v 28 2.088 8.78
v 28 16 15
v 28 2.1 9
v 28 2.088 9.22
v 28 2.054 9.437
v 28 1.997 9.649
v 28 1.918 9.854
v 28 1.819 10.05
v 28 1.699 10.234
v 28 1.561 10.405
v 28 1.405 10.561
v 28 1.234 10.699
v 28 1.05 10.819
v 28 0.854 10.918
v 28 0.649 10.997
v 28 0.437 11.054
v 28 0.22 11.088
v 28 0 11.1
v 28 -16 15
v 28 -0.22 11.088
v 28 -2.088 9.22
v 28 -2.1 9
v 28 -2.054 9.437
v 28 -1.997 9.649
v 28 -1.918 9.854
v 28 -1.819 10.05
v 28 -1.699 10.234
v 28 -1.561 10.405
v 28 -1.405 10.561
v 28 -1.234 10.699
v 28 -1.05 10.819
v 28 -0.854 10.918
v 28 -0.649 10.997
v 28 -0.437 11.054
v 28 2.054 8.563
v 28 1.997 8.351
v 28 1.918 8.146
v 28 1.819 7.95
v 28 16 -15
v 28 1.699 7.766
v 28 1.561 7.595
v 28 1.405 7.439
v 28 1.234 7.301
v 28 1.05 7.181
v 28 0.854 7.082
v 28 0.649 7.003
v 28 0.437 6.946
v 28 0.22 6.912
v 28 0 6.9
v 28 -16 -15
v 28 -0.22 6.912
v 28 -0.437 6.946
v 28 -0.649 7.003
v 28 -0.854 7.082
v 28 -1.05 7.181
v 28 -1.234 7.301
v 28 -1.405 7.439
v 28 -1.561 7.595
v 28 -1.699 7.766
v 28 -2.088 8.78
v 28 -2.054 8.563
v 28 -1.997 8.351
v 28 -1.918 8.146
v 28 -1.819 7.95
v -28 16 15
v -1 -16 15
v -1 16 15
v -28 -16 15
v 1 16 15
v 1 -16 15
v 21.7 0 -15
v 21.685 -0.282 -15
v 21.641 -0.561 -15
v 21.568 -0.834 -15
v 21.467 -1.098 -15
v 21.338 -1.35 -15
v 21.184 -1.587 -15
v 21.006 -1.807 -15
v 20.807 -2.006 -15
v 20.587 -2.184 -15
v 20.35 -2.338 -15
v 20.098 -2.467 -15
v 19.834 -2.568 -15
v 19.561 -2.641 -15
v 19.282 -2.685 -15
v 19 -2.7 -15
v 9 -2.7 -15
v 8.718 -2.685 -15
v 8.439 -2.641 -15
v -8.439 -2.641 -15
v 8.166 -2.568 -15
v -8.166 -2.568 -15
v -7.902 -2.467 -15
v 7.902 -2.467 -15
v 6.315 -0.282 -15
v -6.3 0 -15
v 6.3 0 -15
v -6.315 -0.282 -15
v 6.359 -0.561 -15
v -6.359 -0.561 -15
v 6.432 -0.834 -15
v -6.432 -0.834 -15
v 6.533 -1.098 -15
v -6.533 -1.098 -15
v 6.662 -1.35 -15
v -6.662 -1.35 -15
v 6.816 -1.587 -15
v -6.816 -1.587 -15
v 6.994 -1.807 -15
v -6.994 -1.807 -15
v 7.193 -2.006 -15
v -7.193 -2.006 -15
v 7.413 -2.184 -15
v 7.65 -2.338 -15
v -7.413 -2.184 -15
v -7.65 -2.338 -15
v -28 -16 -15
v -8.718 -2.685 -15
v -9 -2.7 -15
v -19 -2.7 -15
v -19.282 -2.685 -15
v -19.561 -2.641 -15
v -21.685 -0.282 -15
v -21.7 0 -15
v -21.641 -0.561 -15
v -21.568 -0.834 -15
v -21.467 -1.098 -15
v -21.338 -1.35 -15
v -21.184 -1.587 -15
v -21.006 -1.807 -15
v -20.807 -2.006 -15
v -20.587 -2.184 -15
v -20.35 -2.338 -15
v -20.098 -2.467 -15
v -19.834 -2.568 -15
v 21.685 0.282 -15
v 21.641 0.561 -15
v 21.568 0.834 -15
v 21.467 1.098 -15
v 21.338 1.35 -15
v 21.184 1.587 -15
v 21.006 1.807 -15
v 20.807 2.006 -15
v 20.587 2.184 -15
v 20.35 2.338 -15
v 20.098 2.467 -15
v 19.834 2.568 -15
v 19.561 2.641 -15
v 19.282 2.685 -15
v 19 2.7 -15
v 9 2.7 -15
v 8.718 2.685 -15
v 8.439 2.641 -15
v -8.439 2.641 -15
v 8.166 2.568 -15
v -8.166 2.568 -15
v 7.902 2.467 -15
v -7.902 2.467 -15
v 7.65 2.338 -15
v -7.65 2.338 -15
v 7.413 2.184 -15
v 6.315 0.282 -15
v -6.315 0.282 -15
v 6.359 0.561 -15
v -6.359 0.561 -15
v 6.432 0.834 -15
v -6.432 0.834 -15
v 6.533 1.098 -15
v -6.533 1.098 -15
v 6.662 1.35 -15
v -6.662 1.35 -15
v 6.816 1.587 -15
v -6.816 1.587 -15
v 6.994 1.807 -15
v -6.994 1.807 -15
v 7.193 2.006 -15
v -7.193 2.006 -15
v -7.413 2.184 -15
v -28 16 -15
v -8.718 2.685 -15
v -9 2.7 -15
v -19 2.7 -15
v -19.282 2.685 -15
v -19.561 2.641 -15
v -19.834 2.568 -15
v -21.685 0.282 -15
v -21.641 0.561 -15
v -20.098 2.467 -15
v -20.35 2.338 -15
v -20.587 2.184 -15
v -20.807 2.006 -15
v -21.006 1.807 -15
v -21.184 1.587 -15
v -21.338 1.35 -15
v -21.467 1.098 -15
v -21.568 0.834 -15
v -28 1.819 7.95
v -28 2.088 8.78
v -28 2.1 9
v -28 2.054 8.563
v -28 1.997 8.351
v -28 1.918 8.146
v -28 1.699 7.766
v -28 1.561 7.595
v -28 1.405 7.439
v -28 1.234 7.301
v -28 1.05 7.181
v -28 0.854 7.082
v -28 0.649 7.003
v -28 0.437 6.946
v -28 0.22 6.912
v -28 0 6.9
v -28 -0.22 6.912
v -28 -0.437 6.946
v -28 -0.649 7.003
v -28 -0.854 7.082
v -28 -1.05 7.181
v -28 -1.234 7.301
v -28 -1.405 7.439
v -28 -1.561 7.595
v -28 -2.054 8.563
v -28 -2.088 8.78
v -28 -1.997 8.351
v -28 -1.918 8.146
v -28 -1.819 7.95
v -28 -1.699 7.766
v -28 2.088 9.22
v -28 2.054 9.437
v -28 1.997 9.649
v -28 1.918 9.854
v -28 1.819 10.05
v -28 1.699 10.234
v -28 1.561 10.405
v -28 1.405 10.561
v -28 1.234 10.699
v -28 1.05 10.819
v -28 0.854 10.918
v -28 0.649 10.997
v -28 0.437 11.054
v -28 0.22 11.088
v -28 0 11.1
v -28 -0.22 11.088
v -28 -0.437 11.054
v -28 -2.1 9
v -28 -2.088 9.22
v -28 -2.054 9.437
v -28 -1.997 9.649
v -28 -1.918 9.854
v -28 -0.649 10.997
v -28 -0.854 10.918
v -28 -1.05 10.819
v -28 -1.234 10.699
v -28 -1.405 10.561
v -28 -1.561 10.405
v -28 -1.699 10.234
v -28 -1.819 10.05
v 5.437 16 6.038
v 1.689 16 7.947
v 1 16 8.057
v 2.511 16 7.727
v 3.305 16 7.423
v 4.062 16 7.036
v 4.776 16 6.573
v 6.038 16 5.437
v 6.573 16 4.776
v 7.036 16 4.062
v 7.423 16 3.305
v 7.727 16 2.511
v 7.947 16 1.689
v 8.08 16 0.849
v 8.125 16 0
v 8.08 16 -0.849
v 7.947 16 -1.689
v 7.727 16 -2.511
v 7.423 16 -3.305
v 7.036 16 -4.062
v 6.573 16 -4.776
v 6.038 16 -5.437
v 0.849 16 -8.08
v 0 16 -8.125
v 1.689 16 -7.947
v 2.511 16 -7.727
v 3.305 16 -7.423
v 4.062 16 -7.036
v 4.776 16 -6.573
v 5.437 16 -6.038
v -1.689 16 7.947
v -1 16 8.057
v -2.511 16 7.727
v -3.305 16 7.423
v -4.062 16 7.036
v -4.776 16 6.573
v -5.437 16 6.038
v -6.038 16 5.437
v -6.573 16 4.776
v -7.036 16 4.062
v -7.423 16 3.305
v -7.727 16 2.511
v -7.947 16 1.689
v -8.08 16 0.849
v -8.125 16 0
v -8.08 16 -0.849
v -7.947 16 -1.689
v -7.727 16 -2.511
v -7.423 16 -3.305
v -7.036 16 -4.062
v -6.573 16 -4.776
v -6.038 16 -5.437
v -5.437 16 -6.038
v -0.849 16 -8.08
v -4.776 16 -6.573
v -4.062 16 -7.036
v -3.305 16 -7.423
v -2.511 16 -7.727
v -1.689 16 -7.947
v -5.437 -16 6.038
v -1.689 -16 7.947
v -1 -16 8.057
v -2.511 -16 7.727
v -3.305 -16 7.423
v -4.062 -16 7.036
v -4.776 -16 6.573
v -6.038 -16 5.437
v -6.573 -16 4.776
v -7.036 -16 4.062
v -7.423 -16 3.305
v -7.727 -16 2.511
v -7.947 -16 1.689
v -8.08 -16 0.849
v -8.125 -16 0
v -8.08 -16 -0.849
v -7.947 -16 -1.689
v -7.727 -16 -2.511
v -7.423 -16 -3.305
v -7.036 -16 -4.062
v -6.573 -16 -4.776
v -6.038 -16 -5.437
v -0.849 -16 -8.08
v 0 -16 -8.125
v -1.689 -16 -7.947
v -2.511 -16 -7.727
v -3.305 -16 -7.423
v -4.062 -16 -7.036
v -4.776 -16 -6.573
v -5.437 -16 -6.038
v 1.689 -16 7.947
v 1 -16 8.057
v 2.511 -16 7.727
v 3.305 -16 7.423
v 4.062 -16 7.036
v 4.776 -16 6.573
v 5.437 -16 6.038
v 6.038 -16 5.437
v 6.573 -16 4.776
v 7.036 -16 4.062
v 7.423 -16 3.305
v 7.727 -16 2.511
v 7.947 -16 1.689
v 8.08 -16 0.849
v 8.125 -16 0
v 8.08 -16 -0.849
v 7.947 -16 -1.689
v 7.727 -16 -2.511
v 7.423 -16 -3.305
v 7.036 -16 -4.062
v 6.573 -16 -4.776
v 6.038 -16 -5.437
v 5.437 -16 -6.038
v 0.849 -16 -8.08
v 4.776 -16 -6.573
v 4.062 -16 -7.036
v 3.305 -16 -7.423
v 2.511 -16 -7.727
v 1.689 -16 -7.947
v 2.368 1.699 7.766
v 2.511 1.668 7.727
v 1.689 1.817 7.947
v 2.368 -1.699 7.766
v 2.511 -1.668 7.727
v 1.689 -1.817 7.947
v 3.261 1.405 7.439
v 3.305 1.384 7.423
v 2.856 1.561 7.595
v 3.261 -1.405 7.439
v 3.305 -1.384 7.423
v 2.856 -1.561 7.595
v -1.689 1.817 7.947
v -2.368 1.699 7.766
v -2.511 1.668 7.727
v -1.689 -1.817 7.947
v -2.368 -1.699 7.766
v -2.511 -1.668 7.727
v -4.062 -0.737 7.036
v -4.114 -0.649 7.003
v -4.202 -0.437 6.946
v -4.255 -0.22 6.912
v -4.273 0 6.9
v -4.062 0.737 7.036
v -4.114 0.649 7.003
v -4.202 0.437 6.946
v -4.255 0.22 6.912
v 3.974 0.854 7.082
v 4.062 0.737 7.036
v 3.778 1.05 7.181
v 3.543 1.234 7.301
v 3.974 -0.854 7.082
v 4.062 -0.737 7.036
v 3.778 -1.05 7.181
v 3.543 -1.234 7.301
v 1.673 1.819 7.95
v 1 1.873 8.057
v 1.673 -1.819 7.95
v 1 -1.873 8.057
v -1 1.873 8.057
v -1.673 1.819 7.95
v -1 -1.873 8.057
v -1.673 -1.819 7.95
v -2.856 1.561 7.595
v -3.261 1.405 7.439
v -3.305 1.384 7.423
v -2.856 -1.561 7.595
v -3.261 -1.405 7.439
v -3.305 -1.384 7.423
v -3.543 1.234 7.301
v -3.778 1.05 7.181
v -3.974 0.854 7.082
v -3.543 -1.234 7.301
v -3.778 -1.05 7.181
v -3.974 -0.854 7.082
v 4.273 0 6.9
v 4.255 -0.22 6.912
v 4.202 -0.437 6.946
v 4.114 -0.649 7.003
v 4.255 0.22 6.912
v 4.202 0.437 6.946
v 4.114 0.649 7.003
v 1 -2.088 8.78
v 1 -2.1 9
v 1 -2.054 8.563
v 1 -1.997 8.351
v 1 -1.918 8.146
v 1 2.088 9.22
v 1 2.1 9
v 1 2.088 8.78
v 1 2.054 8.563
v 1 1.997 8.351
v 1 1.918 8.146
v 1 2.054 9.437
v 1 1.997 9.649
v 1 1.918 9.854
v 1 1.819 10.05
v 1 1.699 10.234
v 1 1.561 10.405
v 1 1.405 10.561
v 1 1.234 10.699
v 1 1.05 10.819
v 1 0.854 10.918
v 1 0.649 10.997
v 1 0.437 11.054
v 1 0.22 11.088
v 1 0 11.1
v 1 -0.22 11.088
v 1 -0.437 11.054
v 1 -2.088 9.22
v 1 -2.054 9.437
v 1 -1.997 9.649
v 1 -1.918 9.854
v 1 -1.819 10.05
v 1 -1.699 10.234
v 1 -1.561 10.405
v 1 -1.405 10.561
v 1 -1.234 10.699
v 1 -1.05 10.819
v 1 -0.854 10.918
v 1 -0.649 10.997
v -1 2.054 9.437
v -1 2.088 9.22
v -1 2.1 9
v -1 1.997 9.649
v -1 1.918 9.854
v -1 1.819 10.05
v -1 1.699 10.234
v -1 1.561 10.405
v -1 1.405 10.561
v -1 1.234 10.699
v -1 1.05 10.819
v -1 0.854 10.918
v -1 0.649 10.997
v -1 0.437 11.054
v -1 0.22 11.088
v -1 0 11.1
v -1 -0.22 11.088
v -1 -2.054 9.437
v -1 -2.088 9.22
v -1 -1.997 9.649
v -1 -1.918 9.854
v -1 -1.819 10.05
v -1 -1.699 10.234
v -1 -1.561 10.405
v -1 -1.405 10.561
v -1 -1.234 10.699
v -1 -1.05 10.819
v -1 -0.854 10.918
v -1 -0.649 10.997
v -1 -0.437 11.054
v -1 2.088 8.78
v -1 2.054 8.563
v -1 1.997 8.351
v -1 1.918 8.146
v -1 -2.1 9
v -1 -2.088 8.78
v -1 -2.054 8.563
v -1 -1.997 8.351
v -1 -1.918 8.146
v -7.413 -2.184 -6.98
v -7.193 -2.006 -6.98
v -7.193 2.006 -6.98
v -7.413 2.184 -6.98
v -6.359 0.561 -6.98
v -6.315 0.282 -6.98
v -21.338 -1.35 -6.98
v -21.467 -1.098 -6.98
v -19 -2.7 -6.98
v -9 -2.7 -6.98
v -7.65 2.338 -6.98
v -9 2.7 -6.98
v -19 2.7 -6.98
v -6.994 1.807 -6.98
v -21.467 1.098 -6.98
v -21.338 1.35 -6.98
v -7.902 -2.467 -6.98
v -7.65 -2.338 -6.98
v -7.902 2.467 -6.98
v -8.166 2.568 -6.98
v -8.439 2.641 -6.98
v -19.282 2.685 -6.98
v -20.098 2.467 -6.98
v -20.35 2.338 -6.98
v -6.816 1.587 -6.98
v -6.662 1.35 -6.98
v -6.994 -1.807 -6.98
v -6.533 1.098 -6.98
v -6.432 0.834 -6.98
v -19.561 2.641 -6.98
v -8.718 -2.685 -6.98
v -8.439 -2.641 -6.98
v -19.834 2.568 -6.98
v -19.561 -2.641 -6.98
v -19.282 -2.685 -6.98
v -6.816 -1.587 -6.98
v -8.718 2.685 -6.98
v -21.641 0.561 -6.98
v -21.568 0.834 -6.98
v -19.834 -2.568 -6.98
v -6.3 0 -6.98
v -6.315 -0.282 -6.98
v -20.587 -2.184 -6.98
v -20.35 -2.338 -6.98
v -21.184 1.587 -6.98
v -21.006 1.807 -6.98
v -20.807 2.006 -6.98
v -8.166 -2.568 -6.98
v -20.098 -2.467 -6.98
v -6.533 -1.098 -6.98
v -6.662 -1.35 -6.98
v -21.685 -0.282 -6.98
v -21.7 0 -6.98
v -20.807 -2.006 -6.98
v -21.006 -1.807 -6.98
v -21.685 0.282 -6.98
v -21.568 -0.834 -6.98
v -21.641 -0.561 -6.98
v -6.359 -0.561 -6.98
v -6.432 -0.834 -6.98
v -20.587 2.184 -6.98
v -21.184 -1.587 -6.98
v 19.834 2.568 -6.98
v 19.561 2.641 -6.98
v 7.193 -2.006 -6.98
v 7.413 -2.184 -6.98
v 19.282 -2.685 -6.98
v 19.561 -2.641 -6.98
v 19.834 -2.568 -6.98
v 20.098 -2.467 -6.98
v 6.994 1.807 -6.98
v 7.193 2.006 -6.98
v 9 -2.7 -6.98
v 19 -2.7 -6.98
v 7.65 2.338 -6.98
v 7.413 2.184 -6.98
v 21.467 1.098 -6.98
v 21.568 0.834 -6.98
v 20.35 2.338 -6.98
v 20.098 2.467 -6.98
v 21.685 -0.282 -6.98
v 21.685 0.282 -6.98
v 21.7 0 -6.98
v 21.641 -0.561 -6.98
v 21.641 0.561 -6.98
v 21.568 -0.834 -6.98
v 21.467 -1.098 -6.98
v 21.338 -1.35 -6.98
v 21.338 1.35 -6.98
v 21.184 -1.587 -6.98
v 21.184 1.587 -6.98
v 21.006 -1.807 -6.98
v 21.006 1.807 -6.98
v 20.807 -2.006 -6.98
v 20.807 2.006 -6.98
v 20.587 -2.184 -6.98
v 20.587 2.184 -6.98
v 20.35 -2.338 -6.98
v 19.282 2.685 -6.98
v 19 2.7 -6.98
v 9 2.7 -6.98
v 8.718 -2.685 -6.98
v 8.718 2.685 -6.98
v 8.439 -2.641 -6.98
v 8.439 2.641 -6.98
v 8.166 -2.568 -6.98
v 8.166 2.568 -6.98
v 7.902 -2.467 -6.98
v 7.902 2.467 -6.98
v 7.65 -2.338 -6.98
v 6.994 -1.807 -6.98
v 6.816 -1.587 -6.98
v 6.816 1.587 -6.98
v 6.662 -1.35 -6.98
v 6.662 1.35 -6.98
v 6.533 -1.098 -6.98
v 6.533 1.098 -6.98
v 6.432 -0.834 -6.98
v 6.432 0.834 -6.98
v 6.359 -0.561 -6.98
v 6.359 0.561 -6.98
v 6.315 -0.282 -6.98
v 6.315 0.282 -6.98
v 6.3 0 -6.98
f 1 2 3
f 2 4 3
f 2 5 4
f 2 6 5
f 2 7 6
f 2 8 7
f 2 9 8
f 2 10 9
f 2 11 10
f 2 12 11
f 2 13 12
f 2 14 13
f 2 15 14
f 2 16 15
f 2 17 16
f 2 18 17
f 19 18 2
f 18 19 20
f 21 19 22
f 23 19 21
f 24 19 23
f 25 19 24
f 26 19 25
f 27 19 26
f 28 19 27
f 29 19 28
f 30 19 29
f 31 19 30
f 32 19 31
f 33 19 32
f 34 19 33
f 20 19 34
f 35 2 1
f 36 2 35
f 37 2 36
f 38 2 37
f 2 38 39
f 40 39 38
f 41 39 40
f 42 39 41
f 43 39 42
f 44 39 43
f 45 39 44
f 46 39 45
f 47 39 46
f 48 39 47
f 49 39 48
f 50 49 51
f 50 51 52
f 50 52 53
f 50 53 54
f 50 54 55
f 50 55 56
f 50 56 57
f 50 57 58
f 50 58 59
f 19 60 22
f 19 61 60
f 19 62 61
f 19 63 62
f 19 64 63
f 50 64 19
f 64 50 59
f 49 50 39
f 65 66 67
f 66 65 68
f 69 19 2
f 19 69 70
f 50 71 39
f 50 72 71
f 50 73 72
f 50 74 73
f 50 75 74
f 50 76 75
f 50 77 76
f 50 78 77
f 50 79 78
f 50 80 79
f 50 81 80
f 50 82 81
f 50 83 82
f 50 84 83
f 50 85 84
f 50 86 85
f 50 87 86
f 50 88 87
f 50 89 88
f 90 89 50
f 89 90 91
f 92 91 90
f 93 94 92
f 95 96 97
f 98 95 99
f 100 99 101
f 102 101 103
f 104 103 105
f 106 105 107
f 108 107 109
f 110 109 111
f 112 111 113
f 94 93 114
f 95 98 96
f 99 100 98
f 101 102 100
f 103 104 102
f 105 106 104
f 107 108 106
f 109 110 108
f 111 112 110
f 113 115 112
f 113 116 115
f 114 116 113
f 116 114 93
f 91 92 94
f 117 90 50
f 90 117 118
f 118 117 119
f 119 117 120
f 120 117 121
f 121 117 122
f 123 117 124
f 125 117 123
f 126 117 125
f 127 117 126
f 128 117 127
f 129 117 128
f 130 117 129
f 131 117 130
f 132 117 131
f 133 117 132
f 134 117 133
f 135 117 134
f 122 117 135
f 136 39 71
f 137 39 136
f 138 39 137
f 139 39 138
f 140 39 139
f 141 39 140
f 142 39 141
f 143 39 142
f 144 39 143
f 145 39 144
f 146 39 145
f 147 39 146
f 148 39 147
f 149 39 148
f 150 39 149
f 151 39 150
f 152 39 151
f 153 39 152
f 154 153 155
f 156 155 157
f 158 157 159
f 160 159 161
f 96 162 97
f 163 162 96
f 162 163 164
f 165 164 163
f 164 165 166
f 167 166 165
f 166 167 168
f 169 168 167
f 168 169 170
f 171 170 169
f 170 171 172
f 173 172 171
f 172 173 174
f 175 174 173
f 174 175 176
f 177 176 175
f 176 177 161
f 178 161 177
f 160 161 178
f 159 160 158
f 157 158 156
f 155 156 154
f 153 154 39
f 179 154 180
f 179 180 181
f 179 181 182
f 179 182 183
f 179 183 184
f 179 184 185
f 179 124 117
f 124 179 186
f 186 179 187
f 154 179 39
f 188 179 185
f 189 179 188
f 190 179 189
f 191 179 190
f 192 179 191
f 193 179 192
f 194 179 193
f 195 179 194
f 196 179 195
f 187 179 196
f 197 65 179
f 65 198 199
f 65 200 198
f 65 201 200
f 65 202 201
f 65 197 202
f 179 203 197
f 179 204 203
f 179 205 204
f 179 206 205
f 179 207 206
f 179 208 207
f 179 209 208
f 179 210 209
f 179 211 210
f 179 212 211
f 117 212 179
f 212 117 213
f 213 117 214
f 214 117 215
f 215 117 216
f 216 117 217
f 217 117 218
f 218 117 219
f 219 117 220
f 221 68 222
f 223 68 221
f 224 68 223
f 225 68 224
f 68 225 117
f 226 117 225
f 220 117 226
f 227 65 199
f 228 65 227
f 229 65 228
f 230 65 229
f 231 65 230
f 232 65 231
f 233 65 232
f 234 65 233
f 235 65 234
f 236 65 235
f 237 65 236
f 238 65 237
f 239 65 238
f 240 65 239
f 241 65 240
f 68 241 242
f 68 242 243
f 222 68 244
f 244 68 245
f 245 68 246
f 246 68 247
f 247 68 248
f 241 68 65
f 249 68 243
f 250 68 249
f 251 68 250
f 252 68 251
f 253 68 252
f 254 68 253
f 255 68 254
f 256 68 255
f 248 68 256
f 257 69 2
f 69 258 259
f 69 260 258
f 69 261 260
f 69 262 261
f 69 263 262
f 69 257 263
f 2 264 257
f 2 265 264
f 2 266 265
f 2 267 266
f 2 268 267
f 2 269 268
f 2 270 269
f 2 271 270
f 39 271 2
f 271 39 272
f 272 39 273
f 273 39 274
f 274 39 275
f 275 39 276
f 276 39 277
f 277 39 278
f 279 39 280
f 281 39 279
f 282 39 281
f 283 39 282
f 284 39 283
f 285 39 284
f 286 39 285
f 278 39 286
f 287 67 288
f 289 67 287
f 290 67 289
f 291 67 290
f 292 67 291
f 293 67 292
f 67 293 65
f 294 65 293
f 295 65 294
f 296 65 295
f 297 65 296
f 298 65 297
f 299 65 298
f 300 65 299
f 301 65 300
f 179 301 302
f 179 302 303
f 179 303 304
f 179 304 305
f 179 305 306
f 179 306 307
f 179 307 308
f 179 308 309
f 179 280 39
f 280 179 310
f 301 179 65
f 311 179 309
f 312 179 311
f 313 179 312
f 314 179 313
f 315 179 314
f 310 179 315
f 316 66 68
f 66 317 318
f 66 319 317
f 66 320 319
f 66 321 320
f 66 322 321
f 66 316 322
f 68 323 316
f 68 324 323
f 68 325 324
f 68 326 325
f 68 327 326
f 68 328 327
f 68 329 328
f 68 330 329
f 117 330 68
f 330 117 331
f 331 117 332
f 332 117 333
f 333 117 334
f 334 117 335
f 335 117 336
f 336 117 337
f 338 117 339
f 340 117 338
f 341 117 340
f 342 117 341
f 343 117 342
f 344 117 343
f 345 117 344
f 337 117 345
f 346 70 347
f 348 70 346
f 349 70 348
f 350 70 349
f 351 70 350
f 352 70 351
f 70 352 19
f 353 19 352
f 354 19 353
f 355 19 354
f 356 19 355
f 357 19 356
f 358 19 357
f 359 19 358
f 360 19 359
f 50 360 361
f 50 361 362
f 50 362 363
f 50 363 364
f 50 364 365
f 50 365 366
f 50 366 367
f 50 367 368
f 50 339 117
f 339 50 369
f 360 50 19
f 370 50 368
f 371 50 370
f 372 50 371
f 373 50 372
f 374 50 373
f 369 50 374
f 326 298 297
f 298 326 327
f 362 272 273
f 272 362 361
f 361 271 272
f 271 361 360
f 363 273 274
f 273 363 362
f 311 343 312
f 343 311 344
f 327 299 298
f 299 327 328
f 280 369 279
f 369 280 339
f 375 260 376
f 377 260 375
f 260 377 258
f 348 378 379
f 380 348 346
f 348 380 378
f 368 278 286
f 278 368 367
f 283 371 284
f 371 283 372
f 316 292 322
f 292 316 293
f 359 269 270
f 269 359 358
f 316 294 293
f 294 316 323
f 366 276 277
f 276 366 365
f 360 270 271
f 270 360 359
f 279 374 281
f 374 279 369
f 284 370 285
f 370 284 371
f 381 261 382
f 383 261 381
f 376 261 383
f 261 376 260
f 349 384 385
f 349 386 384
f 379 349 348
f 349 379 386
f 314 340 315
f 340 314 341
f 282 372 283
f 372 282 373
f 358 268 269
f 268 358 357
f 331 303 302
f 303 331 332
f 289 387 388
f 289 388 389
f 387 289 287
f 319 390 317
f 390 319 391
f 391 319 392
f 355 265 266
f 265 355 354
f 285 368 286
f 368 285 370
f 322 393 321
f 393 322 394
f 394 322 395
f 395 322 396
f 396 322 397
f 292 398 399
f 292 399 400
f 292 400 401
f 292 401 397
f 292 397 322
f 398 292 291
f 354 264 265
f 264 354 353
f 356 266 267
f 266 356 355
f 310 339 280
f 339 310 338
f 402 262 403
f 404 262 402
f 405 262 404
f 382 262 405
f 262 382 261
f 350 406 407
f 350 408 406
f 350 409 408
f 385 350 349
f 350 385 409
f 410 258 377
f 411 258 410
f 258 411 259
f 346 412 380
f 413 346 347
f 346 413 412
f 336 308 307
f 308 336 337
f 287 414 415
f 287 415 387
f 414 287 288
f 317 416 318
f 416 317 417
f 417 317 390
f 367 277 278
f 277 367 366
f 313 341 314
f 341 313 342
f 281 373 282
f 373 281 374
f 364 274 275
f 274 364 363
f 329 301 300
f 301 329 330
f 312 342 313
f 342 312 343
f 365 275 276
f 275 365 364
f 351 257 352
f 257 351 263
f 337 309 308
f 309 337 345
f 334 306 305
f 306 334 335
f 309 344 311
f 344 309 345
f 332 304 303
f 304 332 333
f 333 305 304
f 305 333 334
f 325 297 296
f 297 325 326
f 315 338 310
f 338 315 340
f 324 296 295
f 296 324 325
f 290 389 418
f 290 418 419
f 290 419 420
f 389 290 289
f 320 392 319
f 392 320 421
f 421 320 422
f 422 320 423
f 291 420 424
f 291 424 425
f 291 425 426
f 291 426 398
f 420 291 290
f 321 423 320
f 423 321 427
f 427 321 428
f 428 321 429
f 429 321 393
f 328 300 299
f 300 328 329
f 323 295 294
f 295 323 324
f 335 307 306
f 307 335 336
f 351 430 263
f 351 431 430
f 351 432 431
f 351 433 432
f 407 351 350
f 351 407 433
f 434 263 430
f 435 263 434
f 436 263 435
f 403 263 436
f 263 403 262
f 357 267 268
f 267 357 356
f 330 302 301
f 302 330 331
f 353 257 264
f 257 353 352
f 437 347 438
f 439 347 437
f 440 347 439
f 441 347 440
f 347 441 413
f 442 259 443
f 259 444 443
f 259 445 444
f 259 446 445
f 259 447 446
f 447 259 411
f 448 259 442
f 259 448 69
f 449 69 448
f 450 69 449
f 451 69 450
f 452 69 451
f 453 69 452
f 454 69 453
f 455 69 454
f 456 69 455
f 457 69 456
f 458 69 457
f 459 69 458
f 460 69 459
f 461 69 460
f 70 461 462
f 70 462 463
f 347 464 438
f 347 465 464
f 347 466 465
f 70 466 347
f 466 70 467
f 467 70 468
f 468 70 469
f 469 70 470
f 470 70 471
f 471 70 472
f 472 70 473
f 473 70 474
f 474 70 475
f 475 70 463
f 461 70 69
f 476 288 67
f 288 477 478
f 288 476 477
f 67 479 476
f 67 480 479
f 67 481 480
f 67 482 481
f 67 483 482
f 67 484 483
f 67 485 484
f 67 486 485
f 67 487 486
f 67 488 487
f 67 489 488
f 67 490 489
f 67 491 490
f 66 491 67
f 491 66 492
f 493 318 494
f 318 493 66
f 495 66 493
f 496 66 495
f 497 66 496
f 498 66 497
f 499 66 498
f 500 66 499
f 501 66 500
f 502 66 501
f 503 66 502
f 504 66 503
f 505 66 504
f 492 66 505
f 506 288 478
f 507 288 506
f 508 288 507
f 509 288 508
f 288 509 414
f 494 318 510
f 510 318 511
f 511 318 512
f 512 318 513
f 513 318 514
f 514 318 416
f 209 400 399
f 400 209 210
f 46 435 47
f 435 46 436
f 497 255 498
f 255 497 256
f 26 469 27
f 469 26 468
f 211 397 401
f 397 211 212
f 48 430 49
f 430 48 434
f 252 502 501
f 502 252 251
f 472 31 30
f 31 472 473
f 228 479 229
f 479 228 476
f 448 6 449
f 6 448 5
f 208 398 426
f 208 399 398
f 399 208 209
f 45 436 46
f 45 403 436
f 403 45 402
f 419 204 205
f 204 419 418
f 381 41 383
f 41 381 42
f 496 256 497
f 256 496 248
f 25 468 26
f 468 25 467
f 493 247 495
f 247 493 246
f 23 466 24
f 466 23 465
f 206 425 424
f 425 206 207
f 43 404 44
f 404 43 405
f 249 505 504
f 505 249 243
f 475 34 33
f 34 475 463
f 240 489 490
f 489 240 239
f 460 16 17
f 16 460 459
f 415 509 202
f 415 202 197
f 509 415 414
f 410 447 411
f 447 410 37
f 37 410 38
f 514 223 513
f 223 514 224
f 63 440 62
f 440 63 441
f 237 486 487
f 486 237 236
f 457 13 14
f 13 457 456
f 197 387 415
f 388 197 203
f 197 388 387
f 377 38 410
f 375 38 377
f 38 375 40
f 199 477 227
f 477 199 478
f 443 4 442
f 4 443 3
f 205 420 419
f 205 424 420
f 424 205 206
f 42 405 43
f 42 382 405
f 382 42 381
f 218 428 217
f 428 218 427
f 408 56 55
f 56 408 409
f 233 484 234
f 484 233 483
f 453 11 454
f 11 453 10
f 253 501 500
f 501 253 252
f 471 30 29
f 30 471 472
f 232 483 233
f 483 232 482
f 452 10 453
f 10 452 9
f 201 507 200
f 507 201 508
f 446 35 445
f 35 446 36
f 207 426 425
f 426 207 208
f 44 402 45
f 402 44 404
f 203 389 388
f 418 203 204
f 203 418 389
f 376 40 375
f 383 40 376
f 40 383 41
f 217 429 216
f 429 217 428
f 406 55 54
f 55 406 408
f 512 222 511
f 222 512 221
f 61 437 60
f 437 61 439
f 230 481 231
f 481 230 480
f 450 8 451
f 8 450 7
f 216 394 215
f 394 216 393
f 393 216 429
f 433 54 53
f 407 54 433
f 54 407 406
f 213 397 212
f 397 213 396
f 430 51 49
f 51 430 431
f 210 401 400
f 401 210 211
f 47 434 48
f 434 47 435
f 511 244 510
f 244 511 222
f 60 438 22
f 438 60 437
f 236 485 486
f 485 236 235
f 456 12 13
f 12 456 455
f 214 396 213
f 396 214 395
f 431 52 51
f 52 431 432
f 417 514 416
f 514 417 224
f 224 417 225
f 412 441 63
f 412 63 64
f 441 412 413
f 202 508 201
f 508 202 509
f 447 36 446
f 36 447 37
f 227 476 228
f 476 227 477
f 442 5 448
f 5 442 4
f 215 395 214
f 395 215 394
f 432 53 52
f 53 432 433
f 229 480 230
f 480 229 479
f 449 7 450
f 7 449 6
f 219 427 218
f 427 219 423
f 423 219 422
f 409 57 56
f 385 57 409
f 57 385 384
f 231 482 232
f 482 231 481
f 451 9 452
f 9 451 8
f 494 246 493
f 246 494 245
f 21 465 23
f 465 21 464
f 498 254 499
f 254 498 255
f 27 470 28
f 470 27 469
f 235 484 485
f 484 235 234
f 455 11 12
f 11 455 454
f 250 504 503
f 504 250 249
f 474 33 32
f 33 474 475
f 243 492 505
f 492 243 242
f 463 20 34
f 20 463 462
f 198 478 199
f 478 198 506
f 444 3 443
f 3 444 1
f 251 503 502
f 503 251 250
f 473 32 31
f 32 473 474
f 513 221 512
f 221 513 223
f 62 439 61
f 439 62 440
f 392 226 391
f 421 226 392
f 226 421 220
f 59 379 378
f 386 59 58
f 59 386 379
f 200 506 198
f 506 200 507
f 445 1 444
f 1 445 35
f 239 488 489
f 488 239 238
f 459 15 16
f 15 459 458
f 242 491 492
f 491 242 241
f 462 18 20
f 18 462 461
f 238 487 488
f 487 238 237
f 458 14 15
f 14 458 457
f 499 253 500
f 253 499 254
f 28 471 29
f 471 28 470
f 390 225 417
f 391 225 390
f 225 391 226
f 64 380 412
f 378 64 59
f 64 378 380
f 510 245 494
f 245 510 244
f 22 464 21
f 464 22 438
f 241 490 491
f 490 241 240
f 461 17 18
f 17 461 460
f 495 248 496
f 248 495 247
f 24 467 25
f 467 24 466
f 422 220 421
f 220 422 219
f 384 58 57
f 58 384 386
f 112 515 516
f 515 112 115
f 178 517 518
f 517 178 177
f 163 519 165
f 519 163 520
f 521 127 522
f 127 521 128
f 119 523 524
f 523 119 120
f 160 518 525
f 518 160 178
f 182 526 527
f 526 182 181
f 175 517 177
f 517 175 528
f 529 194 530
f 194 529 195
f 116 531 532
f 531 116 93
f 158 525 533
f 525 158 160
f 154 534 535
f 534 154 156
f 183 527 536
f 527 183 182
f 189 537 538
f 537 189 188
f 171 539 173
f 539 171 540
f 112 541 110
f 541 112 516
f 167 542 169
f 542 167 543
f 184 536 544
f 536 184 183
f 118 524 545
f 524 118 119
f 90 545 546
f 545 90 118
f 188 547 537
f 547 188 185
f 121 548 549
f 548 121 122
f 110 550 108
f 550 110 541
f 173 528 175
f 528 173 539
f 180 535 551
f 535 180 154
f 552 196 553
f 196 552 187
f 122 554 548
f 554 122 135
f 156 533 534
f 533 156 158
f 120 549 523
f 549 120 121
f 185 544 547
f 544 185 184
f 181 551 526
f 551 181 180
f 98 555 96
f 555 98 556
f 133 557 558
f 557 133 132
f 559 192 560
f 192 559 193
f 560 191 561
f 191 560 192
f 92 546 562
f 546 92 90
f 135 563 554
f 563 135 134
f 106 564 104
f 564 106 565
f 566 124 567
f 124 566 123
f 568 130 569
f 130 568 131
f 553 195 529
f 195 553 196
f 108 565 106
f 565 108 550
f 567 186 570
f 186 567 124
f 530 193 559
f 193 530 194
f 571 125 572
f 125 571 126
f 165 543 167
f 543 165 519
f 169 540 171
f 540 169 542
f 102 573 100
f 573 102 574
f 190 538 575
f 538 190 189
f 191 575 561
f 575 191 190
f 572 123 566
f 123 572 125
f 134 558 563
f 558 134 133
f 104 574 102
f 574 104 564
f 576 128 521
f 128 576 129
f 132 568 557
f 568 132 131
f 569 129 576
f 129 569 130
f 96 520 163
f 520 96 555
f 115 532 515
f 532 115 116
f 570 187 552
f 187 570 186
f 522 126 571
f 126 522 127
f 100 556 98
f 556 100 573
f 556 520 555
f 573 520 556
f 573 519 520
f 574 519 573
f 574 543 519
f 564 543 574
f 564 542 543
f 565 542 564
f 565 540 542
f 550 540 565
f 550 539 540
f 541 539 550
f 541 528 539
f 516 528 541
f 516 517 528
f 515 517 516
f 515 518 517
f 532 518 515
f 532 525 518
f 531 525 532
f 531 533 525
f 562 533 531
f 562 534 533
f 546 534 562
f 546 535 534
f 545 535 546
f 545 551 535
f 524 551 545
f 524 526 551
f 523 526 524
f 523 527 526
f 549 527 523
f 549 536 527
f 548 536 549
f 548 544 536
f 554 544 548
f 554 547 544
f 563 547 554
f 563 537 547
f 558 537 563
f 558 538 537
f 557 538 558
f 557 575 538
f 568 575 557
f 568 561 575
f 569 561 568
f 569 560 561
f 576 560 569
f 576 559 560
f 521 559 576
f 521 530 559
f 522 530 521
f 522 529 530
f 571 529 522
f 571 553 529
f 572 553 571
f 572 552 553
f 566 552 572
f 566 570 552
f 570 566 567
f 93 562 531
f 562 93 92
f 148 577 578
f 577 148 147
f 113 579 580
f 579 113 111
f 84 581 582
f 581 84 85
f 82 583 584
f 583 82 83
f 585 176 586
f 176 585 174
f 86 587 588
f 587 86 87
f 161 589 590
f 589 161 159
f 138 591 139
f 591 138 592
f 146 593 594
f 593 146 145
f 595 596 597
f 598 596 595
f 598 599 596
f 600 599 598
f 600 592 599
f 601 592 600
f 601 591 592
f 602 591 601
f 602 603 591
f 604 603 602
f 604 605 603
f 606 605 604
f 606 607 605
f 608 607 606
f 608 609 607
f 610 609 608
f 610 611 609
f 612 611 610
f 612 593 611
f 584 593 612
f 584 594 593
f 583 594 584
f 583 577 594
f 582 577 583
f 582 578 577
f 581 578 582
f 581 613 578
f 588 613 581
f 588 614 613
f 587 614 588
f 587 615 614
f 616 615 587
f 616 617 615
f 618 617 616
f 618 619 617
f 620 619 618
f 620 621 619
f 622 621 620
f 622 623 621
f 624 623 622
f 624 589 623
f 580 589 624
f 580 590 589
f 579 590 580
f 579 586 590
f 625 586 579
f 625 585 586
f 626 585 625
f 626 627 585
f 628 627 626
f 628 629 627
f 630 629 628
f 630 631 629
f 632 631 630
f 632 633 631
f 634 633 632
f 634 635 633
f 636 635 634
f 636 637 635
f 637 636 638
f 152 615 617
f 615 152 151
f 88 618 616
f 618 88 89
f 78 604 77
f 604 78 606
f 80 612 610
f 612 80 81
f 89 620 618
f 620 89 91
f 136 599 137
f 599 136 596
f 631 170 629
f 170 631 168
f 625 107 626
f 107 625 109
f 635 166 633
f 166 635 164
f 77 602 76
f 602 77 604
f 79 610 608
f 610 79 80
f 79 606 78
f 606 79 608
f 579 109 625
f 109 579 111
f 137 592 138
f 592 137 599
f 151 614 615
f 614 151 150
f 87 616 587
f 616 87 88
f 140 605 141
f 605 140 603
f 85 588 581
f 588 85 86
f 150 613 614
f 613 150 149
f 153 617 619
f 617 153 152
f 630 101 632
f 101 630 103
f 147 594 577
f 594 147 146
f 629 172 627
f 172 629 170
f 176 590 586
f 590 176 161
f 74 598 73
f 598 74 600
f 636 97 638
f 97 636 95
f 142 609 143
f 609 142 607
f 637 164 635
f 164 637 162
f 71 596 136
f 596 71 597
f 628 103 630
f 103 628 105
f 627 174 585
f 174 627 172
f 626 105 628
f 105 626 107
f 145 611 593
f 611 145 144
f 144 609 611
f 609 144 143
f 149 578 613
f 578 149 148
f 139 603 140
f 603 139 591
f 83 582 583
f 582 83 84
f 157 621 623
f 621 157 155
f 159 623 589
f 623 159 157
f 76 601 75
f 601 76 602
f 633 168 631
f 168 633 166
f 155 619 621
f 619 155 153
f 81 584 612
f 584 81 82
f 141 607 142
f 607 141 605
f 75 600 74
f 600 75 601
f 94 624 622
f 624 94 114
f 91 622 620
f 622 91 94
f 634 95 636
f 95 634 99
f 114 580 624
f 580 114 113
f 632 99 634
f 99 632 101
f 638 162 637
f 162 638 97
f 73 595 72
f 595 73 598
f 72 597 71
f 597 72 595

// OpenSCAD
// Split housing for 16 mm OD linear bearing.
$fn = 60;
eps = 0.02;
bearing_d = 16;
body_l = 56;
body_d = 32;
body_h = 30;
slot_w = 2;
module mount_slot(x) {
    hull() {
        translate([x - 5, 0, -body_h / 2 - eps]) cylinder(d = 5.4, h = 8 + 2 * eps);
        translate([x + 5, 0, -body_h / 2 - eps]) cylinder(d = 5.4, h = 8 + 2 * eps);
    }
}
difference() {
    cube([body_l, body_d, body_h], center = true);
    translate([0, -body_d / 2 - eps, 0]) rotate([-90, 0, 0]) cylinder(d = bearing_d + 0.25, h = body_d + 2 * eps);
    translate([-slot_w / 2, -body_d / 2 - eps, 0]) cube([slot_w, body_d + 2 * eps, body_h / 2 + eps]);
    translate([-body_l / 2 - eps, 0, body_h / 2 - 6]) rotate([0, 90, 0]) cylinder(d = 4.2, h = body_l + 2 * eps);
    mount_slot(-body_l / 4);
    mount_slot(body_l / 4);
}
